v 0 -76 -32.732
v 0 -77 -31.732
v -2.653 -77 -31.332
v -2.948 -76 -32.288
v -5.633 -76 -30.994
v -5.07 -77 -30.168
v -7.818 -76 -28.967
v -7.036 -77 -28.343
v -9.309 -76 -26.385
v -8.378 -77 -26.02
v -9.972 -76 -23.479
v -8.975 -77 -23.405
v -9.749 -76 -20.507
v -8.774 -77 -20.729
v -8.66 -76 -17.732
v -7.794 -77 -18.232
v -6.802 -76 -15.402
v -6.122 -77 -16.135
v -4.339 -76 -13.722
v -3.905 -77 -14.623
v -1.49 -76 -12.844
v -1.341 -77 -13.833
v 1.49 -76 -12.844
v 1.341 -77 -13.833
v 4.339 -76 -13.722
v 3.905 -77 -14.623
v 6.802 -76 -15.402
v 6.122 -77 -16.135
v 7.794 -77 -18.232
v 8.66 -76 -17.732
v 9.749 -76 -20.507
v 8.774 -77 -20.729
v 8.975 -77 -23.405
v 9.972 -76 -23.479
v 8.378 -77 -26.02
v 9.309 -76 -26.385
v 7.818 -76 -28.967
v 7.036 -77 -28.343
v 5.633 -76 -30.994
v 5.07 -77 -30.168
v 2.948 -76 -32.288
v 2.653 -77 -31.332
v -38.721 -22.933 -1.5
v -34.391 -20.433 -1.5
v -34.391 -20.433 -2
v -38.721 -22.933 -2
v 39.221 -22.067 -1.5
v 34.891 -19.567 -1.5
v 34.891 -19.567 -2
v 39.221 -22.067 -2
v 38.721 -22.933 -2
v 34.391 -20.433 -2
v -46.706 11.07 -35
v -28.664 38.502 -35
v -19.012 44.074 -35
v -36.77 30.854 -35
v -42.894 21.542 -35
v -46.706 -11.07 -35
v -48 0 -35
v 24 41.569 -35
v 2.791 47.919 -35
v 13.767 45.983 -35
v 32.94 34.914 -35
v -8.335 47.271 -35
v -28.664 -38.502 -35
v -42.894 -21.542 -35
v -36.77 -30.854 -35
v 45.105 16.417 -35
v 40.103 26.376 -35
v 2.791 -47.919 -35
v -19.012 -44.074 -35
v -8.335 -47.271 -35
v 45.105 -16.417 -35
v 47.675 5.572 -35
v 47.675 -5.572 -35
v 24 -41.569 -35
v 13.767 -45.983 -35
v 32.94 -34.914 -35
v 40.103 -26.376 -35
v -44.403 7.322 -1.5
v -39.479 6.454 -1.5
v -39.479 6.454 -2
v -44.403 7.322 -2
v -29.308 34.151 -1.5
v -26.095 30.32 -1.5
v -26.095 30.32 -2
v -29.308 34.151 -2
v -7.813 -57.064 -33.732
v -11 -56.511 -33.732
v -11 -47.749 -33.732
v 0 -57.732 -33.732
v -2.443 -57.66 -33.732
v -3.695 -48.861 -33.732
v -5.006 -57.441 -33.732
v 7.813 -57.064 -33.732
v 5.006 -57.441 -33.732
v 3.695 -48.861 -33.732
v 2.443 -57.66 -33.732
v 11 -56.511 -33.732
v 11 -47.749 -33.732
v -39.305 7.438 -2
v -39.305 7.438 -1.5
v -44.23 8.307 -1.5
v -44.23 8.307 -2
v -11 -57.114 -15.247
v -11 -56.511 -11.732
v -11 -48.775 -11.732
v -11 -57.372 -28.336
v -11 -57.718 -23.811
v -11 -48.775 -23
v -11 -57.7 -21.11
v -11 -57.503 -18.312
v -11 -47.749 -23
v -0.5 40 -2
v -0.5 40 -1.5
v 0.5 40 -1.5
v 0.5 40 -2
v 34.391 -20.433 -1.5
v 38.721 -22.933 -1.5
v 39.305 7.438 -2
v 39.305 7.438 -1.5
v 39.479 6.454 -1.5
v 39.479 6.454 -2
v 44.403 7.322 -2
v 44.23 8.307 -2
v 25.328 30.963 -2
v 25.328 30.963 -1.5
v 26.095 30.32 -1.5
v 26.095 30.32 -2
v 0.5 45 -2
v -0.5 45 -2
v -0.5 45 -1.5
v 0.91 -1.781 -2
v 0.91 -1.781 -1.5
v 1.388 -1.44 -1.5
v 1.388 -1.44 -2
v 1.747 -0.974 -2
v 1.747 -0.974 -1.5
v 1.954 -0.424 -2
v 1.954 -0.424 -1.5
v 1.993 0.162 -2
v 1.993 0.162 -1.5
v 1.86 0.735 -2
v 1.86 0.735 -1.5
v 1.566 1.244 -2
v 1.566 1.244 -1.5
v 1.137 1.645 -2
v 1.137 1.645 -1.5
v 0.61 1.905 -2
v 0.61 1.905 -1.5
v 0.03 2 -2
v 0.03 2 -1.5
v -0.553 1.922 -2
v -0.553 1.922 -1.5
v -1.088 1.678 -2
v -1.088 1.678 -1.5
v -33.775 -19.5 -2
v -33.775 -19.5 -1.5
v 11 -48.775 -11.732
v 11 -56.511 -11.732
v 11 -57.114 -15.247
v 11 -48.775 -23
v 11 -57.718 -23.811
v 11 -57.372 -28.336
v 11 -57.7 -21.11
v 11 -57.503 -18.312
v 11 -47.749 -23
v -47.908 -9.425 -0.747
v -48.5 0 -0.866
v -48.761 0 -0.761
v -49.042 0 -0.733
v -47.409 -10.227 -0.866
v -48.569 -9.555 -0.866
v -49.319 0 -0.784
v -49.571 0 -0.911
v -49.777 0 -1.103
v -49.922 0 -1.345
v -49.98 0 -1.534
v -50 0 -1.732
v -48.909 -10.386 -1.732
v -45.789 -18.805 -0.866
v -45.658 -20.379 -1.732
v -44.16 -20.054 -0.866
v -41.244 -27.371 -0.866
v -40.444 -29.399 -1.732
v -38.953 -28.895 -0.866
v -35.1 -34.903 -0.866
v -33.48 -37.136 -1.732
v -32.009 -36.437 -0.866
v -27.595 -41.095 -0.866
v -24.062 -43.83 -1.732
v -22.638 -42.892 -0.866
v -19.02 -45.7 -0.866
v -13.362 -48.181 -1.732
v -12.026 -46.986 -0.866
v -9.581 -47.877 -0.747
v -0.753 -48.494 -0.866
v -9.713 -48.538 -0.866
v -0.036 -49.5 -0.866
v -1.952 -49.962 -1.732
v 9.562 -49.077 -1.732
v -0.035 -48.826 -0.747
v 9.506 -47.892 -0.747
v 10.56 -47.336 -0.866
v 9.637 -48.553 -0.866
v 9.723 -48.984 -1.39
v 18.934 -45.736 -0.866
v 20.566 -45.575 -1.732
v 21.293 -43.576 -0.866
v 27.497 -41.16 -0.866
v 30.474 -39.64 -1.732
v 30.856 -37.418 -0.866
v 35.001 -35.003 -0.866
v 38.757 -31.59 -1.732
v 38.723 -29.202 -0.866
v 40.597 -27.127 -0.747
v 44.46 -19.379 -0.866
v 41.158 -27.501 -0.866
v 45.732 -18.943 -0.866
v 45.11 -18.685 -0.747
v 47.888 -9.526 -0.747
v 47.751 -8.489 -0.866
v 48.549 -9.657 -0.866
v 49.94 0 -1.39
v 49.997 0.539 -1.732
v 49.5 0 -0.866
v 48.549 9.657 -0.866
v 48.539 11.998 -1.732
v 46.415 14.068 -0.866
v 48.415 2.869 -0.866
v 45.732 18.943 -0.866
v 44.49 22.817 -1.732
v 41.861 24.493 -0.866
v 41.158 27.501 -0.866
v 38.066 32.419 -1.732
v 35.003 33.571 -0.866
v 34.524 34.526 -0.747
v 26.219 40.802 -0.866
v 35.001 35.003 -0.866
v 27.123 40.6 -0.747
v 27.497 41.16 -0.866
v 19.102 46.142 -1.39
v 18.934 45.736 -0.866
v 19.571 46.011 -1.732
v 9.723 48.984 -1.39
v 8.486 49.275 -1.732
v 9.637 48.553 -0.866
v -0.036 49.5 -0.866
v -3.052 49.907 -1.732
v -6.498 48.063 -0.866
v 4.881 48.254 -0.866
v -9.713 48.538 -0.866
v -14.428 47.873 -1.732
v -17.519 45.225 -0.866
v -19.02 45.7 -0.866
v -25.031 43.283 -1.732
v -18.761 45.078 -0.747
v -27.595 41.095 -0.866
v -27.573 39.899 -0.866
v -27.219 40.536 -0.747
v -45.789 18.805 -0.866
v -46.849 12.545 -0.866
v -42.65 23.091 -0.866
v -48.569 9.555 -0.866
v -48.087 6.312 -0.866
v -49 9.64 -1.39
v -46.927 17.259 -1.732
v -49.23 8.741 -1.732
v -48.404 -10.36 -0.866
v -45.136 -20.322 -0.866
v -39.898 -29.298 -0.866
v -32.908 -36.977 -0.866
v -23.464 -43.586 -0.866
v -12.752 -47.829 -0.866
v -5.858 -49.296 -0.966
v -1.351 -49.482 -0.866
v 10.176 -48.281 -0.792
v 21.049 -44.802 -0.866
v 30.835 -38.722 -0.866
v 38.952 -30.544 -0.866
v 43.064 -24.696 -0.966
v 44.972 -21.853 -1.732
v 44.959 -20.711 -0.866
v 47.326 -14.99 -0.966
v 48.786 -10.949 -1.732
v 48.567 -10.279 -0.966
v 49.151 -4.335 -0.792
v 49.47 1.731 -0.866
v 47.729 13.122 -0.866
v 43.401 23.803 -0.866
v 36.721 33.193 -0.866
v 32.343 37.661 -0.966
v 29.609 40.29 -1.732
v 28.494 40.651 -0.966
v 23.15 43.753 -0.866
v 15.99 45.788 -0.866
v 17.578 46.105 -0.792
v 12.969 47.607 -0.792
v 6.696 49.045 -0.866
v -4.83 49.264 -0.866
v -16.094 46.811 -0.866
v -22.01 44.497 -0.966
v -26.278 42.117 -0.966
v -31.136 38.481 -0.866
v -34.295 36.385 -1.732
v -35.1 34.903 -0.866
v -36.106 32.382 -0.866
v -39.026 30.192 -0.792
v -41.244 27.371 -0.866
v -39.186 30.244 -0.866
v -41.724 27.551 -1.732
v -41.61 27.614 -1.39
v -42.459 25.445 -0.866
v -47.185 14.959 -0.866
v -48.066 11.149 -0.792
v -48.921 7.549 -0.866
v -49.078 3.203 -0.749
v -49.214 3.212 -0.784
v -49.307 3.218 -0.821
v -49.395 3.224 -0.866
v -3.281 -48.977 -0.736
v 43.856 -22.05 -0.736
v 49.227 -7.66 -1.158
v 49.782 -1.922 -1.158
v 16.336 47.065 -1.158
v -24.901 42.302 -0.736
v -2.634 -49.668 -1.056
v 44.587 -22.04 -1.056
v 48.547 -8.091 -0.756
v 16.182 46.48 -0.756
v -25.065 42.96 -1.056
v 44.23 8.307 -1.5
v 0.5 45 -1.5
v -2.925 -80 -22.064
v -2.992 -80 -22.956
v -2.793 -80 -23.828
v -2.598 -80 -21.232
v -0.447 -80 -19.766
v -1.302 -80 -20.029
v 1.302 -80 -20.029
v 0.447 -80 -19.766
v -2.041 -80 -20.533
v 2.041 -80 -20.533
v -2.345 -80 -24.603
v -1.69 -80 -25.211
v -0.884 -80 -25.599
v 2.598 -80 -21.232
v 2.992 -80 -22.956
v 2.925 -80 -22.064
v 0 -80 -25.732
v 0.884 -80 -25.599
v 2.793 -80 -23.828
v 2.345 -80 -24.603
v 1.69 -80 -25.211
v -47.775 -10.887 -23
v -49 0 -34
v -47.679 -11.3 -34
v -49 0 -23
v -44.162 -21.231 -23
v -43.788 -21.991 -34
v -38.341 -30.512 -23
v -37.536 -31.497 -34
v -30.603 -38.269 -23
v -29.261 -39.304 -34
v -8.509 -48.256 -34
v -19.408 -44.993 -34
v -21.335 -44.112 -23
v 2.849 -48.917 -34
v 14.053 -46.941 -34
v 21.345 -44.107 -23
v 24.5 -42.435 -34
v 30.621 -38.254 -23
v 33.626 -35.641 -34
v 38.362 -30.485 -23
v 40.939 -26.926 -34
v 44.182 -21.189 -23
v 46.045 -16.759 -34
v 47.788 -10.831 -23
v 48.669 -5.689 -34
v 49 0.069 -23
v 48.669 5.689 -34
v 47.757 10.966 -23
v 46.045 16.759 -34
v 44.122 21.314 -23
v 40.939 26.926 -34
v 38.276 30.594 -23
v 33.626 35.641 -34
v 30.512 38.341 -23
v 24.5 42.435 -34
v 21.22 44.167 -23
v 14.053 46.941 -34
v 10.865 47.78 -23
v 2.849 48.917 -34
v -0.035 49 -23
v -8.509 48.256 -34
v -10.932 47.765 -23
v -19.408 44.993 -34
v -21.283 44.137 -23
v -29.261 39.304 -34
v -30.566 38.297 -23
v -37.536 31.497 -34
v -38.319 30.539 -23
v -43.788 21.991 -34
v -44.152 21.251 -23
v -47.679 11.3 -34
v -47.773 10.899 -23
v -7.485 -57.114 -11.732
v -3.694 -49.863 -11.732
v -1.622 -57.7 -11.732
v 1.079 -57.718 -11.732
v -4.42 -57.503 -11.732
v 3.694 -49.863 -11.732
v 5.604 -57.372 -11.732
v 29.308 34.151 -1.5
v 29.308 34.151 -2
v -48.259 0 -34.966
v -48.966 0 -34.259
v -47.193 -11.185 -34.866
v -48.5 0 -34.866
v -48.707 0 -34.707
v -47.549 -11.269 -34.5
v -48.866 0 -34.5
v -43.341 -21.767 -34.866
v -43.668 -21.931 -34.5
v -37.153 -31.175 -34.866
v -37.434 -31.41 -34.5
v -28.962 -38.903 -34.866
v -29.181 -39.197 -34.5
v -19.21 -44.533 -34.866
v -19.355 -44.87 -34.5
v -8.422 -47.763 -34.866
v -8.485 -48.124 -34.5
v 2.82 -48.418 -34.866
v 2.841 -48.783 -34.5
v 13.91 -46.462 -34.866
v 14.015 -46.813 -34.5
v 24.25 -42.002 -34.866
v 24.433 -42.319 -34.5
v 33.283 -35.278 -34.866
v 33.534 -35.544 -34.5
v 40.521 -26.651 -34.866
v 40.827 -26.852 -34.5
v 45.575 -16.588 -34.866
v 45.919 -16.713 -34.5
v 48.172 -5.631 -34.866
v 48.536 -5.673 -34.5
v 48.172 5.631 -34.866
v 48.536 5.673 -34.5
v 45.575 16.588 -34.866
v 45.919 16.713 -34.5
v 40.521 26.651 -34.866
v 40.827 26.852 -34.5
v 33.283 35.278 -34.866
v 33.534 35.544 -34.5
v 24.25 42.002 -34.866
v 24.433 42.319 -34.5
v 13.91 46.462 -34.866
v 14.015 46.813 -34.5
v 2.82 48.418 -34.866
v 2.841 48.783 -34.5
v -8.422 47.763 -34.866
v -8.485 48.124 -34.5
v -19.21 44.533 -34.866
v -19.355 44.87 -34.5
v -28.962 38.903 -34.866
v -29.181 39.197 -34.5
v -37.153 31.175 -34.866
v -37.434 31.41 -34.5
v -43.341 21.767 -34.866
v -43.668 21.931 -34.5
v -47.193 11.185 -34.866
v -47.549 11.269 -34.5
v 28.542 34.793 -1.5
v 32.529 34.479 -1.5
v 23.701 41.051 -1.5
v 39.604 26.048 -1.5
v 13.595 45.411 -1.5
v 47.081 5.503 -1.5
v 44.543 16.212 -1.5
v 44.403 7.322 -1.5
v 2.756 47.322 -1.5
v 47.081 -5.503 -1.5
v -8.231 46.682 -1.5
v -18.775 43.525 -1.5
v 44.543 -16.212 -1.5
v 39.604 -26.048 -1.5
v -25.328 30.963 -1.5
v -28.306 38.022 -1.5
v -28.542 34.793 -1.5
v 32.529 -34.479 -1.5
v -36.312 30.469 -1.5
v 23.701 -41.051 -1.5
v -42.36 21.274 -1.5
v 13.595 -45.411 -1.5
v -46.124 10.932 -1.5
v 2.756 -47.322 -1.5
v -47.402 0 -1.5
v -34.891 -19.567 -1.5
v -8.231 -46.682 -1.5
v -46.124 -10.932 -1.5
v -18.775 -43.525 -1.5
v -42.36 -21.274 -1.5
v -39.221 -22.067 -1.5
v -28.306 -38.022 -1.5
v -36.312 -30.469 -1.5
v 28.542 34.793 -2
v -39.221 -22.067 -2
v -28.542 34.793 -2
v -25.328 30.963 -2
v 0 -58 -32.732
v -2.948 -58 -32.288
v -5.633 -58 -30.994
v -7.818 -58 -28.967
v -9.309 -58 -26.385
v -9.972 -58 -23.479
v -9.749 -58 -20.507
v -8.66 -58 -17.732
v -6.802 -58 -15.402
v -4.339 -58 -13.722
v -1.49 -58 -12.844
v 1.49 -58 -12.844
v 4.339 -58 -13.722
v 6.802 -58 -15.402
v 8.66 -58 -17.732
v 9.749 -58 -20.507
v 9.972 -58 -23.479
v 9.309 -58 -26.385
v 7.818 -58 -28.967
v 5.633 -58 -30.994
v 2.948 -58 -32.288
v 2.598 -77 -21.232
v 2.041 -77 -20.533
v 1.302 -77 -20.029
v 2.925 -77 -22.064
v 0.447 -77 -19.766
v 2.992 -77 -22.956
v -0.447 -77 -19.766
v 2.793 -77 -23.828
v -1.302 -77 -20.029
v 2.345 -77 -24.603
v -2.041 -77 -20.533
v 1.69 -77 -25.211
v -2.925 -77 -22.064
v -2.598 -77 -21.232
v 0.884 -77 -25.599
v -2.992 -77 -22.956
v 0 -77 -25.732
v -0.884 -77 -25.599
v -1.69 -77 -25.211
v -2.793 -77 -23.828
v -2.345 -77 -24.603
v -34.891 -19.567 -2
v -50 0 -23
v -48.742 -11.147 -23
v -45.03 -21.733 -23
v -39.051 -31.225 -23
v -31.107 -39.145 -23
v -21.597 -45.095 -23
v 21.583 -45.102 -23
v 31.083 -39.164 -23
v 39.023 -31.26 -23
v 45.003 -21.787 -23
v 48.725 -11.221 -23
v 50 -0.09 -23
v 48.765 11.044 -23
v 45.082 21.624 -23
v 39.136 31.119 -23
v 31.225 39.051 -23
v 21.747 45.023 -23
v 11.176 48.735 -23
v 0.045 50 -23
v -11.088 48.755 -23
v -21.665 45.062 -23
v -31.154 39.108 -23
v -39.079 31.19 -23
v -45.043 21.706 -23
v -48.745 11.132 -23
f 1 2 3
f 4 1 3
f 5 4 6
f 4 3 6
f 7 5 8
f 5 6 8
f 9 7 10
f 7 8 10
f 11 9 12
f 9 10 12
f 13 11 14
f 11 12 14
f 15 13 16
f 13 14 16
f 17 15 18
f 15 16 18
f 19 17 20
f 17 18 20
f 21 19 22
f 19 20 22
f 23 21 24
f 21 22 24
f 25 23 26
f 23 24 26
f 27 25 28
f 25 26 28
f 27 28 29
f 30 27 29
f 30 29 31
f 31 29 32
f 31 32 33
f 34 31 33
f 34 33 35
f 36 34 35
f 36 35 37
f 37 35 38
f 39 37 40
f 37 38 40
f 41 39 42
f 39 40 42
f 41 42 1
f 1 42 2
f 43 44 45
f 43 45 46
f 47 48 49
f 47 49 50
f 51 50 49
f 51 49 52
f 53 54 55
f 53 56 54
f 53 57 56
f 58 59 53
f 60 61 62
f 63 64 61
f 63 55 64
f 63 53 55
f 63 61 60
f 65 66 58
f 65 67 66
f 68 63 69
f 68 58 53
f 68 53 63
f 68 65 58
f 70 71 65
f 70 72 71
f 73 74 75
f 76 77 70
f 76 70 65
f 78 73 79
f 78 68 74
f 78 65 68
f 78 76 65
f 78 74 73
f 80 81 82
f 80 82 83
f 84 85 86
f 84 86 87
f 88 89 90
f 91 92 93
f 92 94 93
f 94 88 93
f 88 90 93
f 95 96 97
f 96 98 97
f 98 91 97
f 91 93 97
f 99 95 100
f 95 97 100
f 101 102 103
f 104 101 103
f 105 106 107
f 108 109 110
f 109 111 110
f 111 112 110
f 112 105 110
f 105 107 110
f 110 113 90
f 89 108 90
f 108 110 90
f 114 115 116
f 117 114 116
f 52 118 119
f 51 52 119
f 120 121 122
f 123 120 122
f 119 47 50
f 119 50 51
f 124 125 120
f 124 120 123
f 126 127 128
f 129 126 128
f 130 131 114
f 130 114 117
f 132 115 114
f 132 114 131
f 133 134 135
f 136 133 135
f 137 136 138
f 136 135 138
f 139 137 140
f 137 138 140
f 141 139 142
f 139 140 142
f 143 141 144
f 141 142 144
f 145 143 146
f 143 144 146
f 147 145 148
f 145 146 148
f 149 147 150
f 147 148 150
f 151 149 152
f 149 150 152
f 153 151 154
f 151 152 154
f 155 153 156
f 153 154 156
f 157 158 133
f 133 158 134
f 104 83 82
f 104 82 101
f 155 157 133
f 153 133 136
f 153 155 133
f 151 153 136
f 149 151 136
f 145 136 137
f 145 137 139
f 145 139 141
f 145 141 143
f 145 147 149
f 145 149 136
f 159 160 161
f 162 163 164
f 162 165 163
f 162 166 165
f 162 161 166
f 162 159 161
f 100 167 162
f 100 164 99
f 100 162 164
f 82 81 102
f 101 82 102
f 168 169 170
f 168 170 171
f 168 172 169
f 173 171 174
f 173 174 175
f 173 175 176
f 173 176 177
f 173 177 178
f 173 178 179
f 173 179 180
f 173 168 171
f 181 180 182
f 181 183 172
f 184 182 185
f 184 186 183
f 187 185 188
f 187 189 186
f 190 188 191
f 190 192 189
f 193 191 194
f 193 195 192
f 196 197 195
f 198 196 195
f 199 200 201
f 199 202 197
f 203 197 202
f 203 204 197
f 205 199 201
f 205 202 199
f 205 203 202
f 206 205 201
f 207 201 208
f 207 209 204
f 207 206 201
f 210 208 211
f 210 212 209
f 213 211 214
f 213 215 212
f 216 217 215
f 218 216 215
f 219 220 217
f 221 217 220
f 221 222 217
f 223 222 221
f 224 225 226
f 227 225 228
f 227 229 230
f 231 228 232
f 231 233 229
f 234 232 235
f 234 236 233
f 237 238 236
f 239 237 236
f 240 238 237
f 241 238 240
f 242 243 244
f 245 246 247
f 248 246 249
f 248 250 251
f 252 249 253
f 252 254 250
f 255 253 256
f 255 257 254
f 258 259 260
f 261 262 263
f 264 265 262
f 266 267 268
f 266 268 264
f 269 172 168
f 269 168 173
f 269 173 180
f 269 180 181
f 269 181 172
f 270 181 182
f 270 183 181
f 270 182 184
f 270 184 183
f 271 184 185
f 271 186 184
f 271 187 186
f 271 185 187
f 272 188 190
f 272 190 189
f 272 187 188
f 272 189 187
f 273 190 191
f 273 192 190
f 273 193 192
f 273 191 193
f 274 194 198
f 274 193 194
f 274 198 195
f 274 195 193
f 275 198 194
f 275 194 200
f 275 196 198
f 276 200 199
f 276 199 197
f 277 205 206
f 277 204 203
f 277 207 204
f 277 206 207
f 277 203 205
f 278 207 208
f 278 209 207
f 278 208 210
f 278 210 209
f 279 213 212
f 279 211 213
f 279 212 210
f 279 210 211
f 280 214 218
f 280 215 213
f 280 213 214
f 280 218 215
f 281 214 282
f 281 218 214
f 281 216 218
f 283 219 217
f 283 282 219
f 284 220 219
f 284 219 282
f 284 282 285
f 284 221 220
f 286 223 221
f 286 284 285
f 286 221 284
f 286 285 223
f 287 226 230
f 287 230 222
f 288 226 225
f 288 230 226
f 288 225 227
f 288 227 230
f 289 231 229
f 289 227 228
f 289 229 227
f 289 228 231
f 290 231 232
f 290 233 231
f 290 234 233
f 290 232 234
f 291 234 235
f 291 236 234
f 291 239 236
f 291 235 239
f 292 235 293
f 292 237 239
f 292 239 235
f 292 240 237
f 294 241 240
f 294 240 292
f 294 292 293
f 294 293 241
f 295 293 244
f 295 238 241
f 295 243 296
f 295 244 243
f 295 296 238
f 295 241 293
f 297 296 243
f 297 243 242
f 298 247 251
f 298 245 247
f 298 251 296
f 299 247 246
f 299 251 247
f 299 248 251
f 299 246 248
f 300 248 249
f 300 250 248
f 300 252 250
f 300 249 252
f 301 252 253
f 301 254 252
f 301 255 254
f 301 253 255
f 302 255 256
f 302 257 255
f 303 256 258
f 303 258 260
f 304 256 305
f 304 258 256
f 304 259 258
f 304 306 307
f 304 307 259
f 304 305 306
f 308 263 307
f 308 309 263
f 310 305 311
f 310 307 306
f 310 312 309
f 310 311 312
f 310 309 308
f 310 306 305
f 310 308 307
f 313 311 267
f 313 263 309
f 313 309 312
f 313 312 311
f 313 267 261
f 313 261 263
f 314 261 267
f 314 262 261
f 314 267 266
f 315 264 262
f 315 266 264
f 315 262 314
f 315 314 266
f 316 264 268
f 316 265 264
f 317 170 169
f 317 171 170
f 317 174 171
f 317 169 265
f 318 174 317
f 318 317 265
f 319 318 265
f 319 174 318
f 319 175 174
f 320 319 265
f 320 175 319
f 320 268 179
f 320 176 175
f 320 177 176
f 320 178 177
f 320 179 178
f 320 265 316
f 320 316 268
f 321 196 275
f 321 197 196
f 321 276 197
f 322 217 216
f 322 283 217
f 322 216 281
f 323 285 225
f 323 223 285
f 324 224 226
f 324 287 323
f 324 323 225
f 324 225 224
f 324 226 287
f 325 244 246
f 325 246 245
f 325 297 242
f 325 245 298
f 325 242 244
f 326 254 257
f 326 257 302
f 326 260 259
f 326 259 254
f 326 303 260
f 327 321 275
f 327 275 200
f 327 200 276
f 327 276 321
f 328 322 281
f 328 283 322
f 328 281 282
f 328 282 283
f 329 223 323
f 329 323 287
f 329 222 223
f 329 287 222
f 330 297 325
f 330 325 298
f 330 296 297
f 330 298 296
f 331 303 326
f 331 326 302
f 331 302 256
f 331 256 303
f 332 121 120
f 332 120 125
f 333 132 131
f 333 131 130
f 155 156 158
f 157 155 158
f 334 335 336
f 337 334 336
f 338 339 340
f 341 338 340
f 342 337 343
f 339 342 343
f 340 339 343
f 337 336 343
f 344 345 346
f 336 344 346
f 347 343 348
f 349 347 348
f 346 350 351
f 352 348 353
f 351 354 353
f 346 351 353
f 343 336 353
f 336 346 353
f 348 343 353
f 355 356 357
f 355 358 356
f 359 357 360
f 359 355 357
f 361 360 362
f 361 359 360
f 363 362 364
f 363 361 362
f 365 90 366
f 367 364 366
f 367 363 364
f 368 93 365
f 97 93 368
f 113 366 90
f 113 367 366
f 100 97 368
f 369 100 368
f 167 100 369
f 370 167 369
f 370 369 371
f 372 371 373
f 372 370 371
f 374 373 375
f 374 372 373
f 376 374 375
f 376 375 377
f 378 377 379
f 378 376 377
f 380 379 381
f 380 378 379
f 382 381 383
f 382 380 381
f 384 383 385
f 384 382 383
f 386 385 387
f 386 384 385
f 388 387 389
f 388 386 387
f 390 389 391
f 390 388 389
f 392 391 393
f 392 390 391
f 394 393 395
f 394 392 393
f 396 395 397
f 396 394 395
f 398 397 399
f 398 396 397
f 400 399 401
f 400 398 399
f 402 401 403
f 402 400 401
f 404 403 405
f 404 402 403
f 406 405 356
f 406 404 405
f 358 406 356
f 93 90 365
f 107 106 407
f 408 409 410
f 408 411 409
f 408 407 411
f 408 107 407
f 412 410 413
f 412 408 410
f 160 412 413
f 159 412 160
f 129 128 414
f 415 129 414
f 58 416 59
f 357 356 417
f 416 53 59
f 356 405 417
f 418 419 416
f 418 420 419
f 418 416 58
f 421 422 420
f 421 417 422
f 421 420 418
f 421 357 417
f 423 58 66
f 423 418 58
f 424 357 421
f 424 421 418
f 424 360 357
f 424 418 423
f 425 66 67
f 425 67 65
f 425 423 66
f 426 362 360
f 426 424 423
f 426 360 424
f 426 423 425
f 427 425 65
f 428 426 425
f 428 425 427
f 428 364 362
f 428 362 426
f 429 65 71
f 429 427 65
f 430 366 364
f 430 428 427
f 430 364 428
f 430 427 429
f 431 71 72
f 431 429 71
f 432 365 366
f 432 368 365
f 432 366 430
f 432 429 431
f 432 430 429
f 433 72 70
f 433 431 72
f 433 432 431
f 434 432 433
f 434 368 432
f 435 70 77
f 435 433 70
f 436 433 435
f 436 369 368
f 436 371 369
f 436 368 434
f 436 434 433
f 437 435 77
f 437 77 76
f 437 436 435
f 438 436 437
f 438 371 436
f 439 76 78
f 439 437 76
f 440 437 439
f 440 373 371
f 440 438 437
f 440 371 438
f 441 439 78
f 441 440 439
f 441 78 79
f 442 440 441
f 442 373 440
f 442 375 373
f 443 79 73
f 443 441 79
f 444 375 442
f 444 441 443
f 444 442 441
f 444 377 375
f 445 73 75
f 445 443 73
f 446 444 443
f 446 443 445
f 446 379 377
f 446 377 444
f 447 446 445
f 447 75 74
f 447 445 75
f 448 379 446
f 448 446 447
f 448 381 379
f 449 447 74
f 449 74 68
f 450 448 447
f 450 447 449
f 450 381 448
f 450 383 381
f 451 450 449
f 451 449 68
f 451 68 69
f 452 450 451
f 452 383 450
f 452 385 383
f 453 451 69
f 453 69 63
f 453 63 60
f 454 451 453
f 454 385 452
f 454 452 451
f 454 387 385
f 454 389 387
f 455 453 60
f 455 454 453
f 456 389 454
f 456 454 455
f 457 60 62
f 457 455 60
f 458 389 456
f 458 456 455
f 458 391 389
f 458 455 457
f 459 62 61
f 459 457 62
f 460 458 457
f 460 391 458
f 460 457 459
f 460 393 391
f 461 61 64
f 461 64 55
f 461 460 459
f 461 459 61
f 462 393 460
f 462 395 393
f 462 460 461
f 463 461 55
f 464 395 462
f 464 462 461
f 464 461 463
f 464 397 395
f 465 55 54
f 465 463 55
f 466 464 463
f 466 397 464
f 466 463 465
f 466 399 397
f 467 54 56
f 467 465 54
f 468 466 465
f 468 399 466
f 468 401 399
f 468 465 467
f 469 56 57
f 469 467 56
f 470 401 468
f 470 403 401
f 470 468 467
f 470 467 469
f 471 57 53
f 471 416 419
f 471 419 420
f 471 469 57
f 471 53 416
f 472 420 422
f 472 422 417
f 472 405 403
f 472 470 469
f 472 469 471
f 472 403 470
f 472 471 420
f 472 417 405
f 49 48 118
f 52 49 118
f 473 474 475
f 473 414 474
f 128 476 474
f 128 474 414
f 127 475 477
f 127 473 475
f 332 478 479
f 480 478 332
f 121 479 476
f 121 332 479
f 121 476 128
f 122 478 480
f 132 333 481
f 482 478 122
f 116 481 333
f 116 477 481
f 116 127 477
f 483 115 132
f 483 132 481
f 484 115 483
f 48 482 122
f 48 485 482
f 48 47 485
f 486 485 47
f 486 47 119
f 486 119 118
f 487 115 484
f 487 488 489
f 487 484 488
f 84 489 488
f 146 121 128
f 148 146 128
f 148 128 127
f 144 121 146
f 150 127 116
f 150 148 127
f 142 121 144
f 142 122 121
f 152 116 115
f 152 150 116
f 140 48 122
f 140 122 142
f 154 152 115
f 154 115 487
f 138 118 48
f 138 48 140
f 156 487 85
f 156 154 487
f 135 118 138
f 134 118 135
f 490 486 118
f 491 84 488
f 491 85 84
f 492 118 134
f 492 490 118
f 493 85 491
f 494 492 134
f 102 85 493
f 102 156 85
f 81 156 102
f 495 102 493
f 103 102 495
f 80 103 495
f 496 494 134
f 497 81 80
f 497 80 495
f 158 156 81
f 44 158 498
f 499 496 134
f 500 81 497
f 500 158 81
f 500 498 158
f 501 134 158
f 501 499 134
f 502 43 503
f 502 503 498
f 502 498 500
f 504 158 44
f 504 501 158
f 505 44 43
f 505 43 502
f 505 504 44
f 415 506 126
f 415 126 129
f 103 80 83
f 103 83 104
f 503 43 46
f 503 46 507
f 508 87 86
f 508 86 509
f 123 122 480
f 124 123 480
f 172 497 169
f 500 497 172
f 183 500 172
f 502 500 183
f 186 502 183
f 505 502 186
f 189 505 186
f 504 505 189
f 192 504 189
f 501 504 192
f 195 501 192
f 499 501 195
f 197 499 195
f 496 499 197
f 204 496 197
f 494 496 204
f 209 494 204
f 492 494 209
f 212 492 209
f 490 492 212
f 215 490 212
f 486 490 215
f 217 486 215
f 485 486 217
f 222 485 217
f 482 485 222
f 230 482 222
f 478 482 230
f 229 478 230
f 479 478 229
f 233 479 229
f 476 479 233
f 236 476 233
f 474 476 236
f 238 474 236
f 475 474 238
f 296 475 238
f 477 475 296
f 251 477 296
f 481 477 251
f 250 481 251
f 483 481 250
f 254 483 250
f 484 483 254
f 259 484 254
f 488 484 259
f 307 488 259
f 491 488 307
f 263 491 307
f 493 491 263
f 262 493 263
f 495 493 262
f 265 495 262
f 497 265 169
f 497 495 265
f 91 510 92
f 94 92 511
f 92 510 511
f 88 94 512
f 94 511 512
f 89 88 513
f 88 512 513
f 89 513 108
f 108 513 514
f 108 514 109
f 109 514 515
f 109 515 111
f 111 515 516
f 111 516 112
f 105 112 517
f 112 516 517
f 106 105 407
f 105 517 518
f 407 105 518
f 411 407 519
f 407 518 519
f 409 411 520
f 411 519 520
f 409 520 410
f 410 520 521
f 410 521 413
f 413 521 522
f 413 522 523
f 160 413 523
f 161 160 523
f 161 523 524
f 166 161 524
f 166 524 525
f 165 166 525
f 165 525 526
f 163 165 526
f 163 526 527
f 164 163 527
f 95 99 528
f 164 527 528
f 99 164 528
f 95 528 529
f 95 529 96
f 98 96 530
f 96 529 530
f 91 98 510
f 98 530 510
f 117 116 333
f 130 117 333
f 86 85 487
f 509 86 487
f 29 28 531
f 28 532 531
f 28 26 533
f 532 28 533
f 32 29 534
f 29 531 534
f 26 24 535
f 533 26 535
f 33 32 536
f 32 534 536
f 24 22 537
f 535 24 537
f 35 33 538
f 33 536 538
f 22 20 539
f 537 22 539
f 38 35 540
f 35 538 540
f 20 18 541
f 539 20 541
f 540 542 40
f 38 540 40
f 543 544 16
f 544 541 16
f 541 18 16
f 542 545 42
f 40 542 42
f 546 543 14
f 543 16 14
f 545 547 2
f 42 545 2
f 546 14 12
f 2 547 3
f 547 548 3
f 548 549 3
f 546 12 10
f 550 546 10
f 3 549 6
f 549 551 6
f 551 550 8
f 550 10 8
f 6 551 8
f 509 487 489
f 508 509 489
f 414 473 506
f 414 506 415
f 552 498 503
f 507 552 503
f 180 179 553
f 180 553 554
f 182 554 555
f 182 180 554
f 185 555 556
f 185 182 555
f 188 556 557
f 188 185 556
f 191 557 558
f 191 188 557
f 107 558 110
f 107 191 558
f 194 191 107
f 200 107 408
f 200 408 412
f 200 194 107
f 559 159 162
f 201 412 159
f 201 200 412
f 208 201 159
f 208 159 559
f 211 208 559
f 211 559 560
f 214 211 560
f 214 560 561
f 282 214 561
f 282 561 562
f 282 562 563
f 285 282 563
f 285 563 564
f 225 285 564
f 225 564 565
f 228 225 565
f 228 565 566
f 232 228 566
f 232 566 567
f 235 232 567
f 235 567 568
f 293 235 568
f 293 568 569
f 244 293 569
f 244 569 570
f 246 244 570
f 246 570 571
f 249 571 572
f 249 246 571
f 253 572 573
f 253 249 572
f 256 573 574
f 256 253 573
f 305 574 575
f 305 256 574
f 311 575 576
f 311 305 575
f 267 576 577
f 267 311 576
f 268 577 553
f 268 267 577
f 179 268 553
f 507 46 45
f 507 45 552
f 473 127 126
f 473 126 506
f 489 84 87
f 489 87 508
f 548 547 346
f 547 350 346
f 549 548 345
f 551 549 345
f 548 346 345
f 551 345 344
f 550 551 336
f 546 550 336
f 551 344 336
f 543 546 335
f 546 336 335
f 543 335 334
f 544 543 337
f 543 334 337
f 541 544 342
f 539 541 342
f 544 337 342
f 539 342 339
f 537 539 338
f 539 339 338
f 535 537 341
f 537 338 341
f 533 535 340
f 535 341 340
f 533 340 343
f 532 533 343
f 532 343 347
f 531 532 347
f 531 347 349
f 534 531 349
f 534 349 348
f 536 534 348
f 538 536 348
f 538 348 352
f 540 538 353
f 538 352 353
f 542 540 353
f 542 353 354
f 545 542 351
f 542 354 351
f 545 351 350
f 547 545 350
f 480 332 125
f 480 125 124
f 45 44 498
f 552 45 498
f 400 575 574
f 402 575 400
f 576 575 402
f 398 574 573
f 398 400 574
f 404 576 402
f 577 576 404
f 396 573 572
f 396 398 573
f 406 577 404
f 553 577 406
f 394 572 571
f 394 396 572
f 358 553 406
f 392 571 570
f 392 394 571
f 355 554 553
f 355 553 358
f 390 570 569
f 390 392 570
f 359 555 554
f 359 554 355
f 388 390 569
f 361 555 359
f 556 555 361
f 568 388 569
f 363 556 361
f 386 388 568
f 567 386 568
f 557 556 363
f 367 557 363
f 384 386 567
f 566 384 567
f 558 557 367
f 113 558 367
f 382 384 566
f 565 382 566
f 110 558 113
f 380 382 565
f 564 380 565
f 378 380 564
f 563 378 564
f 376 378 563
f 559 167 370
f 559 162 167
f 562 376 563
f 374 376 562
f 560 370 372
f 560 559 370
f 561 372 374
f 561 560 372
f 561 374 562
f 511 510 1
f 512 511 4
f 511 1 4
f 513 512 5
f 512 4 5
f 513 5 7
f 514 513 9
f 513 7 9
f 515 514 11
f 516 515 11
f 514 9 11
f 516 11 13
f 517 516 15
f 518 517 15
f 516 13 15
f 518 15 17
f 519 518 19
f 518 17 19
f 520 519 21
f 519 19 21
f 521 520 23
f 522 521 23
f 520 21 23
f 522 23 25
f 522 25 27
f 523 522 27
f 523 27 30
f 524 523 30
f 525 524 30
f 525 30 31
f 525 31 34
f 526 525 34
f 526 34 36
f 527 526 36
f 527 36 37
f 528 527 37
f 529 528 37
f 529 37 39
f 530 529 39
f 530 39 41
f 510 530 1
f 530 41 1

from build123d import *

# Parameters (mm, degrees)
ZAOBLIT1_R               = 1
SKICA2_W                 = 1
SKICA2_H                 = 5
ODEBRAT_VYSUNUT_M1_DEPTH = 0.5
KRUHOV_POLE1_COUNT       = 9
ODEBRAT_VYSUNUT_M2_DEPTH = 0.5
SKICA4_W                 = 22
SKICA4_H                 = 22
P_IDAT_VYSUNUT_M1_DEPTH  = 80
ZKOSEN_1_SIZE            = 1


with BuildPart() as part:
    # Skica1 → Rotovat1 (revolve)
    with BuildSketch(Plane(origin=(0, 0, 0), x_dir=(0, 0, -1), z_dir=(1, 0, 0)), mode=Mode.PRIVATE) as rotovat1_sk:
        Polygon((0, 50), (1.5, 47.401923789), (1.5, 0), (35, 0), (35, 49), (23, 49), (23, 50), align=None)
    revolve(rotovat1_sk.sketch.rotate(Axis((0, 0, 0), (0, 0, 1)), 90), axis=Axis((0, 0, 0), (0, 0, 1)))  # turned: the seam where the file's is

    # Zaoblit1
    zaoblit1_edges = [part.edges().sort_by_distance(p)[0] for p in [
        (50, 0, 0),
        (49, 0, -35),
    ]]
    fillet(zaoblit1_edges, radius=ZAOBLIT1_R)

    # Skica2 → Odebrat vysunutím1 (cut)
    with BuildSketch(Plane.XY.offset(-1.5)):
        with Locations((0, 42.5)):
            Rectangle(SKICA2_W, SKICA2_H)
    odebrat_vysunut_m1 = extrude(amount=-ODEBRAT_VYSUNUT_M1_DEPTH, mode=Mode.SUBTRACT)

    # Kruhové pole1: Odebrat vysunutím1 ×9 about axis, 2 skipped
    kruhov_pole1_axis = Axis((0, 0, 0), (0, 0, -1))
    add([odebrat_vysunut_m1.rotate(kruhov_pole1_axis, i * 360 / KRUHOV_POLE1_COUNT) for i in range(1, KRUHOV_POLE1_COUNT) if i not in (4, 5)], mode=Mode.SUBTRACT)

    # Skica3 → Odebrat vysunutím2 (cut)
    with BuildSketch(Plane.XY.offset(-1.5)):
        with BuildLine():
            Line((-1.087507328, 1.678489741), (-33.774990748, -19.5))
            Line((-33.774990748, -19.5), (0.909861092, -1.781053844))
            ThreePointArc((0.909861092, -1.781053844), (1.732050808, 1), (-1.087507328, 1.678489741))
        make_face()
    extrude(amount=-ODEBRAT_VYSUNUT_M2_DEPTH, mode=Mode.SUBTRACT)

    # Skica4 → Přidat vysunutím1 (add)
    with BuildSketch(Plane(origin=(0, 0, 0), x_dir=(1, 0, 0), z_dir=(0, 1, 0))):
        with Locations((0, 22.732050808)):
            Rectangle(SKICA4_W, SKICA4_H)
    extrude(amount=-P_IDAT_VYSUNUT_M1_DEPTH)

    # Skica5 → Odebrat rotací1 (revolve, cut)
    with BuildSketch(Plane(origin=(0, 0, 0), x_dir=(0, 0, -1), z_dir=(1, 0, 0)), mode=Mode.PRIVATE) as odebrat_rotac_1_sk:
        Polygon((-8.267949192, -52.373066959), (12.732050808, -58), (12.732050808, -77), (19.732050808, -77), (19.732050808, -80), (-8.267949192, -80), align=None)
    revolve(odebrat_rotac_1_sk.sketch.rotate(Axis((0, -80, -22.732050808), (0, 1, 0)), 180), axis=Axis((0, -80, -22.732050808), (0, 1, 0)), mode=Mode.SUBTRACT)  # turned: the seam where the file's is

    # Zkosení1
    zkosen_1_edges = [part.edges().sort_by_distance(p)[0] for p in [
        (0, -77, -12.732050808),
    ]]
    chamfer(zkosen_1_edges, length=ZKOSEN_1_SIZE)


solid = part.part
